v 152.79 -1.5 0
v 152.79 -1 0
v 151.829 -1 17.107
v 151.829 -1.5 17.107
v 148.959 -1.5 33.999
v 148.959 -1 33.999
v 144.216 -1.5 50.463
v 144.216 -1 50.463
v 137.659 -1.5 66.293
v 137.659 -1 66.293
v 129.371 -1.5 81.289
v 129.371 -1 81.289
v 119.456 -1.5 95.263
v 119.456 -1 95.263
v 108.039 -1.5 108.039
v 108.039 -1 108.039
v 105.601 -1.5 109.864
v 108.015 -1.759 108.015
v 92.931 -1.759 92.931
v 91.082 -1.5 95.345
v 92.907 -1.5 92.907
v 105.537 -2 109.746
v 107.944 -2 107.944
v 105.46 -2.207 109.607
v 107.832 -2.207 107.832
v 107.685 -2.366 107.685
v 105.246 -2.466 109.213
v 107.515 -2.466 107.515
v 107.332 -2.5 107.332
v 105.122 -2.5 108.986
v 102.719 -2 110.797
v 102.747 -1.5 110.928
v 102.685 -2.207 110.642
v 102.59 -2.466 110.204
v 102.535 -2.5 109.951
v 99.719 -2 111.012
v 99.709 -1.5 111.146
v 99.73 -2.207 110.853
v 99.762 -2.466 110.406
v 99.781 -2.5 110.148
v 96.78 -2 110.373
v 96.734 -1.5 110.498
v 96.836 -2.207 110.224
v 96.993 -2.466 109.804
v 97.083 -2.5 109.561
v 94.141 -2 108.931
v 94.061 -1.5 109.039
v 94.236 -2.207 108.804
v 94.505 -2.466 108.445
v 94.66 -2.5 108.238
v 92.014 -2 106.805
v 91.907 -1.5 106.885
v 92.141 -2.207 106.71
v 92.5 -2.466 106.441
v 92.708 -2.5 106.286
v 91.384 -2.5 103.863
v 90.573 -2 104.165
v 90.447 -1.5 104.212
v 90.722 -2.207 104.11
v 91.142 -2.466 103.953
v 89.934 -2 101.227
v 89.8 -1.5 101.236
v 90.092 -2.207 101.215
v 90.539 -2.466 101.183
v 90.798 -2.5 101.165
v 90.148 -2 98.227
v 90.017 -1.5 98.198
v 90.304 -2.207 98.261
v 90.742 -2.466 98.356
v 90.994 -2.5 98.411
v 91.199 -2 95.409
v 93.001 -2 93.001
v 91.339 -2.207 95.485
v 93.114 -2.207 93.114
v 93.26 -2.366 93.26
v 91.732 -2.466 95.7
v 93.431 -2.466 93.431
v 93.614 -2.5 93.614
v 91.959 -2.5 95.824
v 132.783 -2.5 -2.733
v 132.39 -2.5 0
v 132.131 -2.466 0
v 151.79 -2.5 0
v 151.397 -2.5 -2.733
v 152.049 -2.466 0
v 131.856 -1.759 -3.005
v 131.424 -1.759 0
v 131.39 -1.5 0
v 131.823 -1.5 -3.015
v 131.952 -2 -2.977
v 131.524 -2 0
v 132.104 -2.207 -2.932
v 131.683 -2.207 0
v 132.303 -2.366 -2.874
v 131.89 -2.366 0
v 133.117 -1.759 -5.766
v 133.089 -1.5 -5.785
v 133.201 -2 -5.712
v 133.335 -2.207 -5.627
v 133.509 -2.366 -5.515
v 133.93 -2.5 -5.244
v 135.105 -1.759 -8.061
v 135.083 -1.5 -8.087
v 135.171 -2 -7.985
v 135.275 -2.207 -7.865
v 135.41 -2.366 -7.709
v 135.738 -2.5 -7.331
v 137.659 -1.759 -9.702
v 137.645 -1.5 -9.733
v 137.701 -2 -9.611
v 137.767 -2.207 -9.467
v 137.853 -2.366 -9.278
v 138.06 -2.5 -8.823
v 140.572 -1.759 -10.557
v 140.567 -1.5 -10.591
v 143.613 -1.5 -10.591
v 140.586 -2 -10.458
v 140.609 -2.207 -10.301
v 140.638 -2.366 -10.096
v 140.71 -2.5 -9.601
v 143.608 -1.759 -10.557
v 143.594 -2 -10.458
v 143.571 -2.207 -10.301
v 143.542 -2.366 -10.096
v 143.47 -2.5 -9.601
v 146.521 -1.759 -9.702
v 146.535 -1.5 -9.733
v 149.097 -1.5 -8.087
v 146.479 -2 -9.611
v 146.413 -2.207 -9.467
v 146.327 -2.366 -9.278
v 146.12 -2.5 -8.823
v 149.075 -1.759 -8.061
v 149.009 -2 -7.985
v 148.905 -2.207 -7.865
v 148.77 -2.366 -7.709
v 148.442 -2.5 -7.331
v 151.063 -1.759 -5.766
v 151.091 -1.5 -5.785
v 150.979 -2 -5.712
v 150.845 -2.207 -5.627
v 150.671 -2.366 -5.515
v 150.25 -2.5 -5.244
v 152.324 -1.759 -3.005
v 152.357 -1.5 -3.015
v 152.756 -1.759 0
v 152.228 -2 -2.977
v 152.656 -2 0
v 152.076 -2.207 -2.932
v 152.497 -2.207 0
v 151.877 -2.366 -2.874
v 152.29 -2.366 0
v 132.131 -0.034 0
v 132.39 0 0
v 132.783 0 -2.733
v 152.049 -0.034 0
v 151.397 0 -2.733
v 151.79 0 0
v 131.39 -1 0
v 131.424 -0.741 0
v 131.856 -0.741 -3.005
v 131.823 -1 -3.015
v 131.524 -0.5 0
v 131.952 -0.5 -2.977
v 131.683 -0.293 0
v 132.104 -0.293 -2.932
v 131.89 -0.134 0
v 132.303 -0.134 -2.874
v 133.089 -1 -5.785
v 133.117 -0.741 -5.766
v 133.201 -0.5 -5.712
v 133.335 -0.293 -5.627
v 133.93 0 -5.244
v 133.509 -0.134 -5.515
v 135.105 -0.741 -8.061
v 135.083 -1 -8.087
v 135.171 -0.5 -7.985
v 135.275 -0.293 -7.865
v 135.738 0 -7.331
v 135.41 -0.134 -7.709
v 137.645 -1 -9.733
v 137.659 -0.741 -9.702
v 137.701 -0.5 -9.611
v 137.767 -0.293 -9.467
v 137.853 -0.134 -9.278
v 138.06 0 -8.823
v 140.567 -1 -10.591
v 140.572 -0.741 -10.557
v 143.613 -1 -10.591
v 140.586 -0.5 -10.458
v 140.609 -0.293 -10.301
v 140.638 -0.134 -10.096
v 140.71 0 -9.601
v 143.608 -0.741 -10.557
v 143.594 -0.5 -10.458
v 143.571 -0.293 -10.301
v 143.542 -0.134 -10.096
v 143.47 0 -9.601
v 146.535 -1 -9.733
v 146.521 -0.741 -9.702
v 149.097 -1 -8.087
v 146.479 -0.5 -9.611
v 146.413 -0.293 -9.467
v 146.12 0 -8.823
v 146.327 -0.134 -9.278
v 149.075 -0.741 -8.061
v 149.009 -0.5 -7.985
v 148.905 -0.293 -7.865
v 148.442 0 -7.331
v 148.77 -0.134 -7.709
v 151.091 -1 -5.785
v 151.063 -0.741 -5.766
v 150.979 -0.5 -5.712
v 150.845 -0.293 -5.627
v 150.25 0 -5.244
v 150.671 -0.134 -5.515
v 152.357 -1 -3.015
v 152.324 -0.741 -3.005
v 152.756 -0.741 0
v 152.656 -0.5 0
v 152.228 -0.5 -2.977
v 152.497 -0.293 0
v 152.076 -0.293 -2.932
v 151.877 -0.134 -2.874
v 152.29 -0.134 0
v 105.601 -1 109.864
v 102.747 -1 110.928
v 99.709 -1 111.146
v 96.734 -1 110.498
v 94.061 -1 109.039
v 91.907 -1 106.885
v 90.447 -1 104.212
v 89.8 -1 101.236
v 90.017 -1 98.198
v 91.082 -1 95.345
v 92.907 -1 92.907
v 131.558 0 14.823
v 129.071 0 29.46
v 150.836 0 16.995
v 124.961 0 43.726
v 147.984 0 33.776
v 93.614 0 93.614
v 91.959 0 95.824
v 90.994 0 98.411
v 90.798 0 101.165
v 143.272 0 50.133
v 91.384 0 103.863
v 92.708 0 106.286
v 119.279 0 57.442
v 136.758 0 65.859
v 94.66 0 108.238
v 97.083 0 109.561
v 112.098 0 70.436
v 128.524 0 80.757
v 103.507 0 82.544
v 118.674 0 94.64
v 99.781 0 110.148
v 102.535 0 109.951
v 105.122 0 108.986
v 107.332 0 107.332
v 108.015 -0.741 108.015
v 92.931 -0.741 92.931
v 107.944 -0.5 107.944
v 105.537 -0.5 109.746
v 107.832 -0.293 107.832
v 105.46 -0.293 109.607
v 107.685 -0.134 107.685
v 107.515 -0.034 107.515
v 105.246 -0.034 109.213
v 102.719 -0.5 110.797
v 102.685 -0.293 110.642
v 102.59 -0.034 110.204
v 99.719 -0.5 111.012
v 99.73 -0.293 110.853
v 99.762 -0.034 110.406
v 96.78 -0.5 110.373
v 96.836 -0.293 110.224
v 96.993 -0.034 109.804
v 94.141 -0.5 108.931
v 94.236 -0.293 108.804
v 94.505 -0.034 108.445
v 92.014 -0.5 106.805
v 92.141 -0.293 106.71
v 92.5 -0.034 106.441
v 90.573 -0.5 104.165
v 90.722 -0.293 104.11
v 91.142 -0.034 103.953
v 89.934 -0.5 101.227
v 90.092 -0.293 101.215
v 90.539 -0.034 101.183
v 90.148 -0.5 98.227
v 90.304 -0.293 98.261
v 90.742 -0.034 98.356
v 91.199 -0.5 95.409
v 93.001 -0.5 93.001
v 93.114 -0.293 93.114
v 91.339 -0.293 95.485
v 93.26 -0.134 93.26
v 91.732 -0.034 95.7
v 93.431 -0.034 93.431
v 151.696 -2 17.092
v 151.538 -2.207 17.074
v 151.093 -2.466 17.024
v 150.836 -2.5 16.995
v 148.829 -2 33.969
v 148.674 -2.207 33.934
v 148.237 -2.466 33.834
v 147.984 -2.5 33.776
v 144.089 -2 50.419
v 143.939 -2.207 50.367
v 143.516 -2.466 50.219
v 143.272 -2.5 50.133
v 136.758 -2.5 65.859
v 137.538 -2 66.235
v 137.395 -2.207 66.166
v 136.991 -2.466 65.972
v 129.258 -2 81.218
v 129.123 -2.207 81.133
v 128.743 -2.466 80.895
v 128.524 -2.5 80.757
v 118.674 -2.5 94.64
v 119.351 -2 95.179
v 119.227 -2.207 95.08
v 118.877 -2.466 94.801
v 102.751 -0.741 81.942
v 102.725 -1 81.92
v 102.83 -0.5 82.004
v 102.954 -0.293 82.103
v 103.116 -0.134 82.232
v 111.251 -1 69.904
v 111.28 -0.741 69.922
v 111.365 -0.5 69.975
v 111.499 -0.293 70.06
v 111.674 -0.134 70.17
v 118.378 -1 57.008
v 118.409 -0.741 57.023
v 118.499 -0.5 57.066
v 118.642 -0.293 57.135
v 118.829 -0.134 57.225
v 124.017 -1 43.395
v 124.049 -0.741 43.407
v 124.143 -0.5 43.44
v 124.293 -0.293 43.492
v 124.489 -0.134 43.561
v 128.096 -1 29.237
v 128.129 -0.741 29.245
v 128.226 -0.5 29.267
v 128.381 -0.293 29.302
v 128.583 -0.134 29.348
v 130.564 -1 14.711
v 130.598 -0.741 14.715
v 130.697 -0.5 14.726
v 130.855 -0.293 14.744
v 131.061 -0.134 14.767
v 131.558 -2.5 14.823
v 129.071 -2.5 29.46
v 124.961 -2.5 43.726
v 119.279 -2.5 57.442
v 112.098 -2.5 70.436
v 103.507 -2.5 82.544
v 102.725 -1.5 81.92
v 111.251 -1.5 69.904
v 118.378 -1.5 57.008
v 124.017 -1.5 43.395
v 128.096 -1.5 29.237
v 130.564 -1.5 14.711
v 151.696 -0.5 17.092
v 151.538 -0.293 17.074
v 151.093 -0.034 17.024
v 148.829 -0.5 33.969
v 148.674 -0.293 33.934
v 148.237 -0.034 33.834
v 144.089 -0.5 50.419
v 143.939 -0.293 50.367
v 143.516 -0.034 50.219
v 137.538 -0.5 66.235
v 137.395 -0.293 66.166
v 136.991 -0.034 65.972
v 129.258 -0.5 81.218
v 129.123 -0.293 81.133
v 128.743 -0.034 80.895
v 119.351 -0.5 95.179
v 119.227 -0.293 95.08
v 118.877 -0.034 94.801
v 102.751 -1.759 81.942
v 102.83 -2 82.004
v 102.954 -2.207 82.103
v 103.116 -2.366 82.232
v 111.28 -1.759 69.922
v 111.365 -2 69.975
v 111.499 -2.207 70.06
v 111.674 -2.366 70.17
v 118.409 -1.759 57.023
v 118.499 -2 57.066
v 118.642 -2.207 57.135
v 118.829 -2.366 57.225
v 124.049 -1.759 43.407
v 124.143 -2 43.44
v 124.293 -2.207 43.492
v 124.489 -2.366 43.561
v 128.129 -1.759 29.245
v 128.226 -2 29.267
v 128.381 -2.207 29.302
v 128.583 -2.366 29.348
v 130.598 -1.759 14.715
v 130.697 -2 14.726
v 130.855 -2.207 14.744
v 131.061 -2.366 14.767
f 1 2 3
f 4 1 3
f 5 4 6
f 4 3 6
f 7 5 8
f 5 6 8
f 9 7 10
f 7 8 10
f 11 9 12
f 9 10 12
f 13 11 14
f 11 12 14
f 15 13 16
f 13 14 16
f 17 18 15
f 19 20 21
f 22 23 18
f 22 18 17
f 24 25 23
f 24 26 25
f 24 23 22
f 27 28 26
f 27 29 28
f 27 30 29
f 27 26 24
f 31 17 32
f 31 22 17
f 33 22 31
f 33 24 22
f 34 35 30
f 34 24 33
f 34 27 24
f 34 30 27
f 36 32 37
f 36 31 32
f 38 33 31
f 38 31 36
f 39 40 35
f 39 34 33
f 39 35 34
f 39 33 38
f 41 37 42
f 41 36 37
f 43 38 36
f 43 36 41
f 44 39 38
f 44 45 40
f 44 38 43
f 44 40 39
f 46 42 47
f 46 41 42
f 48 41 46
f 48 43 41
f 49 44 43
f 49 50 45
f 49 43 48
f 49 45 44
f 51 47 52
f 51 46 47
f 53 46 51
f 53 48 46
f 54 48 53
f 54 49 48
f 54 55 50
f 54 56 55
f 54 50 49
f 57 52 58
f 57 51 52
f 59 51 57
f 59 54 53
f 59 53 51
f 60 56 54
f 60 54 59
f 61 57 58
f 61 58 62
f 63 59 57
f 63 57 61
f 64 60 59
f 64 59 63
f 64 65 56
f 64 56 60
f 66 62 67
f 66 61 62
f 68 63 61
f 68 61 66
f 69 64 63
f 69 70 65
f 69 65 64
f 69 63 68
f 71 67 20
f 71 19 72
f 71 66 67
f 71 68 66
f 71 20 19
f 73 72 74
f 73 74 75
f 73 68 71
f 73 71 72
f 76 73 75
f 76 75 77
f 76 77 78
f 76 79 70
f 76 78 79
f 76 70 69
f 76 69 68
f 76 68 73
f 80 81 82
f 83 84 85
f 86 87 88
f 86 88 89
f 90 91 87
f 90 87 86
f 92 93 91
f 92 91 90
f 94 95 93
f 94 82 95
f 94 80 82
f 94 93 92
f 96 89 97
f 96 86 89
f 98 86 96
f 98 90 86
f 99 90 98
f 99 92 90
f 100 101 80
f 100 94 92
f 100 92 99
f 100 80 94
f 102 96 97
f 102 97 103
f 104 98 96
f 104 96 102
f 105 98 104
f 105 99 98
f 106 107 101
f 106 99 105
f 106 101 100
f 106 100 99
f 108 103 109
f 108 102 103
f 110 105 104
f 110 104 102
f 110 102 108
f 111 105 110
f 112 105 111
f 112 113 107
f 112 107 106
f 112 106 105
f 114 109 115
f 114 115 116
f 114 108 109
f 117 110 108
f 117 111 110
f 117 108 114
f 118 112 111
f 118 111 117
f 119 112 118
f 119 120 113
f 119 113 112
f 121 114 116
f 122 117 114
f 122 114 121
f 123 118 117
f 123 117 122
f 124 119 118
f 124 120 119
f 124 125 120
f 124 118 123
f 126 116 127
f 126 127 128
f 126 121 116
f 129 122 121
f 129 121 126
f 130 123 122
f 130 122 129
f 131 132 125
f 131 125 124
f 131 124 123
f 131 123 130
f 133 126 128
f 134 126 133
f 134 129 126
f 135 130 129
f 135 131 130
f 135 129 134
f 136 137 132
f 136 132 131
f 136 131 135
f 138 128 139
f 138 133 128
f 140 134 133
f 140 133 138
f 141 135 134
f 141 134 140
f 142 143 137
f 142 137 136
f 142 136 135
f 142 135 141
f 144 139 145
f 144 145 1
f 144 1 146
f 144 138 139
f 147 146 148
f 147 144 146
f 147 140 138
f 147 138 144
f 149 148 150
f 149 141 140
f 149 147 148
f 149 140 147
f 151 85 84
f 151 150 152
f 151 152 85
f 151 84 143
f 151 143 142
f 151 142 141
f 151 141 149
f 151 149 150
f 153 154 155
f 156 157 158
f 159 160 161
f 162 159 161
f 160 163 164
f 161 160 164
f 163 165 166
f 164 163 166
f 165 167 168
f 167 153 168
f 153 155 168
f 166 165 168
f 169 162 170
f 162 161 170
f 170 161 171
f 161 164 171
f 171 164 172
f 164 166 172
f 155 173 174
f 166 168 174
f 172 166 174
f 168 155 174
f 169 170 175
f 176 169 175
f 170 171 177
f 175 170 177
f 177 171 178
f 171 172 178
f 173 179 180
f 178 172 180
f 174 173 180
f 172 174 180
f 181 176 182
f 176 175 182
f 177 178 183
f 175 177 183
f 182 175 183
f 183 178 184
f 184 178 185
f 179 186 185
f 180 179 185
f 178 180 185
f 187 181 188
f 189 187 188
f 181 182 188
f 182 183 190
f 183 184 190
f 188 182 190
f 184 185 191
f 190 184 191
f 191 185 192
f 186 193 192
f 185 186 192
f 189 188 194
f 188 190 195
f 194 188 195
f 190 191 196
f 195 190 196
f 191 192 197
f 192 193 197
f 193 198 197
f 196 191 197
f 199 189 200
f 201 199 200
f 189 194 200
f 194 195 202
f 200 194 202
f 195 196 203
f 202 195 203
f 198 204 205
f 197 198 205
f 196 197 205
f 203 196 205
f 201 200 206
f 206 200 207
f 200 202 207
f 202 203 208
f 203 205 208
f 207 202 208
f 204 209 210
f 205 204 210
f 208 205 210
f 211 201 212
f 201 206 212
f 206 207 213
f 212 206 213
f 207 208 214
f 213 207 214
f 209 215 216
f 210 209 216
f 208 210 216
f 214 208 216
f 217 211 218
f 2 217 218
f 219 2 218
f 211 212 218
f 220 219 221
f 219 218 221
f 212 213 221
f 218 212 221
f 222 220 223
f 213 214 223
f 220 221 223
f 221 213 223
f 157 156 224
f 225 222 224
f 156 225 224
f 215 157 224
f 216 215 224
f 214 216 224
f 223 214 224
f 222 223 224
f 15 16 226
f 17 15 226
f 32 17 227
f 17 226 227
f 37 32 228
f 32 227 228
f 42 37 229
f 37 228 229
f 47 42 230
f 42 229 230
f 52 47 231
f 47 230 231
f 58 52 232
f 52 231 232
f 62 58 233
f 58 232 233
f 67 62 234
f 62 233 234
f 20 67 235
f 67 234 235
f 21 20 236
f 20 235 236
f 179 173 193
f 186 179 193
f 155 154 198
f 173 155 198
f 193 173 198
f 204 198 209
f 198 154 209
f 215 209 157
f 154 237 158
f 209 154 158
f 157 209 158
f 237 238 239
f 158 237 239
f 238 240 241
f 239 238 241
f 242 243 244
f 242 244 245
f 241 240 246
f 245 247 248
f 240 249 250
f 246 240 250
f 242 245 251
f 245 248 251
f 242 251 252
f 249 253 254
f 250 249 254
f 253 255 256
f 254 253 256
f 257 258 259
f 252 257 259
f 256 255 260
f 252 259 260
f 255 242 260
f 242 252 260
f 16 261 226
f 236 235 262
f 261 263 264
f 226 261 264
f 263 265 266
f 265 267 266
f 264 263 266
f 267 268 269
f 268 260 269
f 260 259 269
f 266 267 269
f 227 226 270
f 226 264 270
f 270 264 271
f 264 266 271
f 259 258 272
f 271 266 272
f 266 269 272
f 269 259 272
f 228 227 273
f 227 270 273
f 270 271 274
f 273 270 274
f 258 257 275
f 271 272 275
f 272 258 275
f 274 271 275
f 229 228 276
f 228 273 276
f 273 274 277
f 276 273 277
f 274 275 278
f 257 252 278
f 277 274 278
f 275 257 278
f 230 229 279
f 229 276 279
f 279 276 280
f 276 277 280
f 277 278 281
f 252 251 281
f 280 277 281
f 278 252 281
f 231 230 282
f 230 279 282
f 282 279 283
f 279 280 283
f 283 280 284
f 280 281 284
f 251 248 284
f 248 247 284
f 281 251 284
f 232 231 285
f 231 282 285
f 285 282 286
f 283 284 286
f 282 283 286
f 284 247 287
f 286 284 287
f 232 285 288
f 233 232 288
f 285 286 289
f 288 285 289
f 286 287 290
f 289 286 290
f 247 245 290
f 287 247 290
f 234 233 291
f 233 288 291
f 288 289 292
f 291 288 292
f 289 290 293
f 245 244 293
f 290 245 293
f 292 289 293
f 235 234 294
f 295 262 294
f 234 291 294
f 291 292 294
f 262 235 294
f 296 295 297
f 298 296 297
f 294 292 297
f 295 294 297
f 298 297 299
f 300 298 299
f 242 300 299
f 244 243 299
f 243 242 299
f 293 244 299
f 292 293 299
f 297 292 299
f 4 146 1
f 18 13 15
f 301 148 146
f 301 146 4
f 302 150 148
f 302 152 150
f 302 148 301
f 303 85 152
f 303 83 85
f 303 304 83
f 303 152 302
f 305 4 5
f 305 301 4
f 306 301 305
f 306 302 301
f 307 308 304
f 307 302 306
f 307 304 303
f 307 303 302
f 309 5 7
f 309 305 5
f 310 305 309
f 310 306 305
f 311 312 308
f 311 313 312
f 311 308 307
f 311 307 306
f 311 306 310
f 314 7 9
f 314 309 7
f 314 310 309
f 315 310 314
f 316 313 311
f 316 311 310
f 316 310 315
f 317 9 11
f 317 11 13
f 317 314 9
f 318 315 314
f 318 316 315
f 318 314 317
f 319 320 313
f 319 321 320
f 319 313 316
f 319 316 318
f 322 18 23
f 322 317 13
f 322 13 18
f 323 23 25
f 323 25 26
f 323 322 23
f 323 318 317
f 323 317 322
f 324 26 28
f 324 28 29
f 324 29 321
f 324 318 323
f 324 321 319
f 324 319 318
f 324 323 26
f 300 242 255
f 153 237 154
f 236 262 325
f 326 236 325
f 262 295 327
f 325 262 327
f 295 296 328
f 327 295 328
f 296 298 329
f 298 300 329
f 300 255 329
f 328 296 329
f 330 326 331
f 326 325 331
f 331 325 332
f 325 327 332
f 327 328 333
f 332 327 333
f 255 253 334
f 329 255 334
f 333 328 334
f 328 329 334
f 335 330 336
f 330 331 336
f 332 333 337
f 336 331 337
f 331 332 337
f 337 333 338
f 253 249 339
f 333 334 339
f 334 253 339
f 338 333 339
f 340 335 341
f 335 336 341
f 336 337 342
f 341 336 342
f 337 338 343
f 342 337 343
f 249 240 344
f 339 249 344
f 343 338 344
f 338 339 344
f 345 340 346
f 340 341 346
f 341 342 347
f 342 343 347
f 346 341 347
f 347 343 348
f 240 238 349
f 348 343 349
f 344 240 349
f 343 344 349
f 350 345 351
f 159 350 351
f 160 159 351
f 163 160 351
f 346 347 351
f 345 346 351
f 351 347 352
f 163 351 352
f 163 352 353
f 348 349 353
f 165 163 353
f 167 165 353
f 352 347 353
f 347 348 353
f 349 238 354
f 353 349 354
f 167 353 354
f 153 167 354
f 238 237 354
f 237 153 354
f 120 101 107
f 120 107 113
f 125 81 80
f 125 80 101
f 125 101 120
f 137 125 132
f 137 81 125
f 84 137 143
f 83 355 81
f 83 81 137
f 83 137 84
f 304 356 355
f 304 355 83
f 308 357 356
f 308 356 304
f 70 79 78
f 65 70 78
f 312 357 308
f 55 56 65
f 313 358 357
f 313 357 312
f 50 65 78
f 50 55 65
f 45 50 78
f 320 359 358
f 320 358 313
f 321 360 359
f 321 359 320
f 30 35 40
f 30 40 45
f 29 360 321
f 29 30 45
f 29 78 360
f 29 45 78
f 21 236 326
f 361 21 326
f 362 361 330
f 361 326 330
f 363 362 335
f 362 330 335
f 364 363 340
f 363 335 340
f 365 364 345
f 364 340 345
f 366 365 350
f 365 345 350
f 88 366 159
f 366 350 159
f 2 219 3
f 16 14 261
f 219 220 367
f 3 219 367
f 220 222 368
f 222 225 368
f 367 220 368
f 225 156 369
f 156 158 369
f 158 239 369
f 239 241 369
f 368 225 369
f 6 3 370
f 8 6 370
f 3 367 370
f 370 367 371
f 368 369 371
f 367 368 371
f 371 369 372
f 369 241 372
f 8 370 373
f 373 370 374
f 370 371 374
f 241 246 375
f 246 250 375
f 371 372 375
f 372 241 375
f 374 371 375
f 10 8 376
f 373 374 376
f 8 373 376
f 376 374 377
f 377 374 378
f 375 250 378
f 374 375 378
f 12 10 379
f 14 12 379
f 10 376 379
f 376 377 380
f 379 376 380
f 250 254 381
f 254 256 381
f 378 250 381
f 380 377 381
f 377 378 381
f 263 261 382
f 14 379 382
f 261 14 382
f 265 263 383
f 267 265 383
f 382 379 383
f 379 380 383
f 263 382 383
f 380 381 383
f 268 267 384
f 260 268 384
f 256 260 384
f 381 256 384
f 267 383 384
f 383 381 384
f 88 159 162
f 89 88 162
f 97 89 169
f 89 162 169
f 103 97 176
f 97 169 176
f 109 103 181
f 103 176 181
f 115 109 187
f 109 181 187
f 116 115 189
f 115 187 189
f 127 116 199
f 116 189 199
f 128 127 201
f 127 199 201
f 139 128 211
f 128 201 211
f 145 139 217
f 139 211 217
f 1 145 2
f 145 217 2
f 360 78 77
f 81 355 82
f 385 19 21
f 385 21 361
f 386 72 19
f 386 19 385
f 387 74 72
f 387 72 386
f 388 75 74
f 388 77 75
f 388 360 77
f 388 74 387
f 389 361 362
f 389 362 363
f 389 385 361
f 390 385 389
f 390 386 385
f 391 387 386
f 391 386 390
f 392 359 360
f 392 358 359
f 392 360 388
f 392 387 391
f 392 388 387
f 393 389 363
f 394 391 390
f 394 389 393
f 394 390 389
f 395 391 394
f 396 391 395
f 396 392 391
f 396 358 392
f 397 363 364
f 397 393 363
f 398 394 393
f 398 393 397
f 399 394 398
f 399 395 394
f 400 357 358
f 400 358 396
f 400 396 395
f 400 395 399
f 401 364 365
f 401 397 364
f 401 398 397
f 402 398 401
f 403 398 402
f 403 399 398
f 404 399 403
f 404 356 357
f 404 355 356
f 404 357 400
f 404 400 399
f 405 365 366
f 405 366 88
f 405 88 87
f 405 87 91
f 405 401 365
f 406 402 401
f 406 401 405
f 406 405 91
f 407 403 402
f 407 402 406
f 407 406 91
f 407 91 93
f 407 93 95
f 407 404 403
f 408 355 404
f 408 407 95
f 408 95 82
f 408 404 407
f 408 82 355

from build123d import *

# Parameters (mm, degrees)
F1_DEPTH = 2.5
F2_R     = 1


with BuildPart() as f1:
    # F0 (on Front) → F1 (new body)
    with BuildSketch(Plane.XZ):
        with BuildLine():
            ThreePointArc((131.39, 0), (142.09, -10.7), (152.79, 0))
            ThreePointArc((152.79, 0), (141.159554, 58.470202), (108.038845, 108.038845))
            ThreePointArc((108.038845, 108.038845), (92.90676, 108.038845), (92.90676, 92.90676))
            ThreePointArc((92.90676, 92.90676), (121.388532, 50.280776), (131.39, 0))
        make_face()
    extrude(amount=F1_DEPTH)

    # F2
    f2_edges = [f1.edges().sort_by_distance(p)[0] for p in [
        (141.159554, -2.5, 58.470202),
        (141.159554, 0, 58.470202),
    ]]
    fillet(f2_edges, radius=F2_R)


solid = f1.part
